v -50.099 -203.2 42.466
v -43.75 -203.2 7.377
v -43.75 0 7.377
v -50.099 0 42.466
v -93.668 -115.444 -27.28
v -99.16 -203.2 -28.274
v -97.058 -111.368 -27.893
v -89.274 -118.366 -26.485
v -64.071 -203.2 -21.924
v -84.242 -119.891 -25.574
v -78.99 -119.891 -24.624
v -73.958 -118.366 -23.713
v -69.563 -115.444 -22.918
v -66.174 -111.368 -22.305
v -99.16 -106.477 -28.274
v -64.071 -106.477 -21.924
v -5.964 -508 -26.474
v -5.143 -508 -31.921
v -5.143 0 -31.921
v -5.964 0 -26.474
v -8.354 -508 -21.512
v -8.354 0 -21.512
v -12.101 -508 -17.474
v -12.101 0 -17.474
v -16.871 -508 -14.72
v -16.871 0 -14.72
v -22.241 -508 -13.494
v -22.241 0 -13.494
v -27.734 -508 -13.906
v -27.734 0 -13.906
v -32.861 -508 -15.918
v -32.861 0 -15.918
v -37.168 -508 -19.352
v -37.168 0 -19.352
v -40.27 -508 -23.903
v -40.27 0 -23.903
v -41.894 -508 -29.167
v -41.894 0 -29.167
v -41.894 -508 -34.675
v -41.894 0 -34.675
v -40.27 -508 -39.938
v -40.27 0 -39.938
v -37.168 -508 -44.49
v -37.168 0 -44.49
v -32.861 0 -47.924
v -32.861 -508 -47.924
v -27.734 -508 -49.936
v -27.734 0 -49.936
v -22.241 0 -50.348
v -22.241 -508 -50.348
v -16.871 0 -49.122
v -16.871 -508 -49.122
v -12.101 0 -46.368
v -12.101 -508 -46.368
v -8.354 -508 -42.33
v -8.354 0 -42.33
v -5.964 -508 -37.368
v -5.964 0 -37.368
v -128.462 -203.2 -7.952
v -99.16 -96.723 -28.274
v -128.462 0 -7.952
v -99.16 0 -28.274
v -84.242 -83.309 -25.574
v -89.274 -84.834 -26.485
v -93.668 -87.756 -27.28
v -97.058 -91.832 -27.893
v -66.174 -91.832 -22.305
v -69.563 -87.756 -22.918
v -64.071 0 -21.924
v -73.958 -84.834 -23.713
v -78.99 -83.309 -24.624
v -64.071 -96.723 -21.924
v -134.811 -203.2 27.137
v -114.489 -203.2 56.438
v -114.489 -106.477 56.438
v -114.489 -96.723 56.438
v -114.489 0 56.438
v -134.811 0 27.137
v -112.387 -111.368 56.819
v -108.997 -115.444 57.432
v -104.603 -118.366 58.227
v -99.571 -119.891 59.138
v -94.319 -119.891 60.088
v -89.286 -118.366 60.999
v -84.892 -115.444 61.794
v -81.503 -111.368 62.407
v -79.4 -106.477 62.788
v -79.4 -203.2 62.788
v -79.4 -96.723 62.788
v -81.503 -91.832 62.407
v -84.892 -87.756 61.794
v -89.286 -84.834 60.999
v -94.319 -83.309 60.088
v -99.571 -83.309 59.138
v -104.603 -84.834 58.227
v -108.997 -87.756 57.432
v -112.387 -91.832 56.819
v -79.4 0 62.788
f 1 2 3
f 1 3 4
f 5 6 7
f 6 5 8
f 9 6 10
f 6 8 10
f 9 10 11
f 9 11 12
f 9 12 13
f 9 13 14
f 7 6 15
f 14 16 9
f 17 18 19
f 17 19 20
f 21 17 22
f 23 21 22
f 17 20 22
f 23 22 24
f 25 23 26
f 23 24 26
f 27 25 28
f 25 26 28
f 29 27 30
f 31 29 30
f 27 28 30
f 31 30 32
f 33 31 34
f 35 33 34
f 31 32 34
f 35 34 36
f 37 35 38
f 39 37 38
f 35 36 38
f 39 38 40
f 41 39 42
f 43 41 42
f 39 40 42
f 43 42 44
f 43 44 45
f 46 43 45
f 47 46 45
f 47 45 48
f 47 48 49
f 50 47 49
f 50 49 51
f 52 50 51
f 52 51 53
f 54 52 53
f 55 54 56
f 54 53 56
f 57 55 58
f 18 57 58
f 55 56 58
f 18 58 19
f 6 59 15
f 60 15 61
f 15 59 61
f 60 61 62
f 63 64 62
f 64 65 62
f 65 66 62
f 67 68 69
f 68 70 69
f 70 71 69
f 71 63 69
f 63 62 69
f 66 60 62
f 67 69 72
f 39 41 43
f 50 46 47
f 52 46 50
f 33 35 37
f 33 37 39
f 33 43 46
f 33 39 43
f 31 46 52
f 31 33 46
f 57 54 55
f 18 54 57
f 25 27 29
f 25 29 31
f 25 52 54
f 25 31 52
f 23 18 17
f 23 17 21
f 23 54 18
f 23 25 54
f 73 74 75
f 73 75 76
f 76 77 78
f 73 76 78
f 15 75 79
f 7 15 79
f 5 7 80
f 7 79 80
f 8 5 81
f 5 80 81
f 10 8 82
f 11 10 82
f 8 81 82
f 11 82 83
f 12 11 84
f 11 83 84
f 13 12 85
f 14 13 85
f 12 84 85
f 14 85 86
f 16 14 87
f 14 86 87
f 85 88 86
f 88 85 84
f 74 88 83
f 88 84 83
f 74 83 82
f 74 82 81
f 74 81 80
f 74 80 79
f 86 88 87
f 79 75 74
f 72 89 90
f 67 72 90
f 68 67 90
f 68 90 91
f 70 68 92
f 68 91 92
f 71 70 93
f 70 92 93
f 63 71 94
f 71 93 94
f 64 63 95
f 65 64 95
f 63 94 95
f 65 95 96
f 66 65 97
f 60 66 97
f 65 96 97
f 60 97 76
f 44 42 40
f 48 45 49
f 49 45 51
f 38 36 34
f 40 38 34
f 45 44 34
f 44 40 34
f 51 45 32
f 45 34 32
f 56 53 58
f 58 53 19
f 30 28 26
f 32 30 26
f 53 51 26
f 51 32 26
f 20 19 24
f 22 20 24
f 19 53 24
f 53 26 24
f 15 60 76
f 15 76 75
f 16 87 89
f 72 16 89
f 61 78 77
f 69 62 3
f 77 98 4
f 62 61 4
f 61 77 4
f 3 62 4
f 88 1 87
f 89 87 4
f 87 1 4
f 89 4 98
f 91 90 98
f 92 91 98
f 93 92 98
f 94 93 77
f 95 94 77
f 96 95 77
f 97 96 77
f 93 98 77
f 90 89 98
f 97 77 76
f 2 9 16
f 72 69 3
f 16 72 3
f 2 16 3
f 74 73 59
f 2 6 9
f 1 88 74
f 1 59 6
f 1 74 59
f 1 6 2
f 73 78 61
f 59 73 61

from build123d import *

# Parameters (mm, degrees)
F1_DEPTH = 203.2
F3_DEPTH = 203.2
F4_R     = 18.4785
F5_DEPTH = 508


with BuildPart() as f1:
    # F0 (on Front) → F1 (new body)
    with BuildSketch(Plane.XZ):
        Polygon((-64.0714295495, -21.9243039862), (-43.7495358002, 7.3770304695), (-50.098959215, 42.4659516376), (-79.4002936706, 62.7878453869), (-114.4892148387, 56.4384219721), (-134.811108588, 27.1370875165), (-128.4616851732, -7.9518336516), (-99.1603507176, -28.2737274009), align=None)
    extrude(amount=F1_DEPTH)

    # F2 (on face) → F3 (cut)
    with BuildSketch(Plane(origin=(-13.5188166387, 0, 74.709254736), x_dir=(0.9840195123, 0, 0.178060662), z_dir=(-0.178060662, 0, 0.9840195123))):
        with BuildLine():
            Line((-102.6101585739, -96.7229215922), (-102.6101585739, -106.4770784078))
            ThreePointArc((-102.6101585739, -106.4770784078), (-95.9951181662, -116.2939208433), (-84.7807757576, -120.0843930224))
            ThreePointArc((-84.7807757576, -120.0843930224), (-73.566433349, -116.2939208433), (-66.9513929413, -106.4770784078))
            Line((-66.9513929413, -106.4770784078), (-66.9513929413, -96.7229215922))
            ThreePointArc((-66.9513929413, -96.7229215922), (-84.7807757576, -83.1156069776), (-102.6101585739, -96.7229215922))
        make_face()
    extrude(amount=-F3_DEPTH, mode=Mode.SUBTRACT)


with BuildPart() as f5:
    # F4 (on Front) → F5 (new body)
    with BuildSketch(Plane.XZ):
        with Locations((-23.6219409853, -31.920928508)):
            Circle(F4_R)
    extrude(amount=F5_DEPTH)


solid = Compound([f1.part, f5.part])
